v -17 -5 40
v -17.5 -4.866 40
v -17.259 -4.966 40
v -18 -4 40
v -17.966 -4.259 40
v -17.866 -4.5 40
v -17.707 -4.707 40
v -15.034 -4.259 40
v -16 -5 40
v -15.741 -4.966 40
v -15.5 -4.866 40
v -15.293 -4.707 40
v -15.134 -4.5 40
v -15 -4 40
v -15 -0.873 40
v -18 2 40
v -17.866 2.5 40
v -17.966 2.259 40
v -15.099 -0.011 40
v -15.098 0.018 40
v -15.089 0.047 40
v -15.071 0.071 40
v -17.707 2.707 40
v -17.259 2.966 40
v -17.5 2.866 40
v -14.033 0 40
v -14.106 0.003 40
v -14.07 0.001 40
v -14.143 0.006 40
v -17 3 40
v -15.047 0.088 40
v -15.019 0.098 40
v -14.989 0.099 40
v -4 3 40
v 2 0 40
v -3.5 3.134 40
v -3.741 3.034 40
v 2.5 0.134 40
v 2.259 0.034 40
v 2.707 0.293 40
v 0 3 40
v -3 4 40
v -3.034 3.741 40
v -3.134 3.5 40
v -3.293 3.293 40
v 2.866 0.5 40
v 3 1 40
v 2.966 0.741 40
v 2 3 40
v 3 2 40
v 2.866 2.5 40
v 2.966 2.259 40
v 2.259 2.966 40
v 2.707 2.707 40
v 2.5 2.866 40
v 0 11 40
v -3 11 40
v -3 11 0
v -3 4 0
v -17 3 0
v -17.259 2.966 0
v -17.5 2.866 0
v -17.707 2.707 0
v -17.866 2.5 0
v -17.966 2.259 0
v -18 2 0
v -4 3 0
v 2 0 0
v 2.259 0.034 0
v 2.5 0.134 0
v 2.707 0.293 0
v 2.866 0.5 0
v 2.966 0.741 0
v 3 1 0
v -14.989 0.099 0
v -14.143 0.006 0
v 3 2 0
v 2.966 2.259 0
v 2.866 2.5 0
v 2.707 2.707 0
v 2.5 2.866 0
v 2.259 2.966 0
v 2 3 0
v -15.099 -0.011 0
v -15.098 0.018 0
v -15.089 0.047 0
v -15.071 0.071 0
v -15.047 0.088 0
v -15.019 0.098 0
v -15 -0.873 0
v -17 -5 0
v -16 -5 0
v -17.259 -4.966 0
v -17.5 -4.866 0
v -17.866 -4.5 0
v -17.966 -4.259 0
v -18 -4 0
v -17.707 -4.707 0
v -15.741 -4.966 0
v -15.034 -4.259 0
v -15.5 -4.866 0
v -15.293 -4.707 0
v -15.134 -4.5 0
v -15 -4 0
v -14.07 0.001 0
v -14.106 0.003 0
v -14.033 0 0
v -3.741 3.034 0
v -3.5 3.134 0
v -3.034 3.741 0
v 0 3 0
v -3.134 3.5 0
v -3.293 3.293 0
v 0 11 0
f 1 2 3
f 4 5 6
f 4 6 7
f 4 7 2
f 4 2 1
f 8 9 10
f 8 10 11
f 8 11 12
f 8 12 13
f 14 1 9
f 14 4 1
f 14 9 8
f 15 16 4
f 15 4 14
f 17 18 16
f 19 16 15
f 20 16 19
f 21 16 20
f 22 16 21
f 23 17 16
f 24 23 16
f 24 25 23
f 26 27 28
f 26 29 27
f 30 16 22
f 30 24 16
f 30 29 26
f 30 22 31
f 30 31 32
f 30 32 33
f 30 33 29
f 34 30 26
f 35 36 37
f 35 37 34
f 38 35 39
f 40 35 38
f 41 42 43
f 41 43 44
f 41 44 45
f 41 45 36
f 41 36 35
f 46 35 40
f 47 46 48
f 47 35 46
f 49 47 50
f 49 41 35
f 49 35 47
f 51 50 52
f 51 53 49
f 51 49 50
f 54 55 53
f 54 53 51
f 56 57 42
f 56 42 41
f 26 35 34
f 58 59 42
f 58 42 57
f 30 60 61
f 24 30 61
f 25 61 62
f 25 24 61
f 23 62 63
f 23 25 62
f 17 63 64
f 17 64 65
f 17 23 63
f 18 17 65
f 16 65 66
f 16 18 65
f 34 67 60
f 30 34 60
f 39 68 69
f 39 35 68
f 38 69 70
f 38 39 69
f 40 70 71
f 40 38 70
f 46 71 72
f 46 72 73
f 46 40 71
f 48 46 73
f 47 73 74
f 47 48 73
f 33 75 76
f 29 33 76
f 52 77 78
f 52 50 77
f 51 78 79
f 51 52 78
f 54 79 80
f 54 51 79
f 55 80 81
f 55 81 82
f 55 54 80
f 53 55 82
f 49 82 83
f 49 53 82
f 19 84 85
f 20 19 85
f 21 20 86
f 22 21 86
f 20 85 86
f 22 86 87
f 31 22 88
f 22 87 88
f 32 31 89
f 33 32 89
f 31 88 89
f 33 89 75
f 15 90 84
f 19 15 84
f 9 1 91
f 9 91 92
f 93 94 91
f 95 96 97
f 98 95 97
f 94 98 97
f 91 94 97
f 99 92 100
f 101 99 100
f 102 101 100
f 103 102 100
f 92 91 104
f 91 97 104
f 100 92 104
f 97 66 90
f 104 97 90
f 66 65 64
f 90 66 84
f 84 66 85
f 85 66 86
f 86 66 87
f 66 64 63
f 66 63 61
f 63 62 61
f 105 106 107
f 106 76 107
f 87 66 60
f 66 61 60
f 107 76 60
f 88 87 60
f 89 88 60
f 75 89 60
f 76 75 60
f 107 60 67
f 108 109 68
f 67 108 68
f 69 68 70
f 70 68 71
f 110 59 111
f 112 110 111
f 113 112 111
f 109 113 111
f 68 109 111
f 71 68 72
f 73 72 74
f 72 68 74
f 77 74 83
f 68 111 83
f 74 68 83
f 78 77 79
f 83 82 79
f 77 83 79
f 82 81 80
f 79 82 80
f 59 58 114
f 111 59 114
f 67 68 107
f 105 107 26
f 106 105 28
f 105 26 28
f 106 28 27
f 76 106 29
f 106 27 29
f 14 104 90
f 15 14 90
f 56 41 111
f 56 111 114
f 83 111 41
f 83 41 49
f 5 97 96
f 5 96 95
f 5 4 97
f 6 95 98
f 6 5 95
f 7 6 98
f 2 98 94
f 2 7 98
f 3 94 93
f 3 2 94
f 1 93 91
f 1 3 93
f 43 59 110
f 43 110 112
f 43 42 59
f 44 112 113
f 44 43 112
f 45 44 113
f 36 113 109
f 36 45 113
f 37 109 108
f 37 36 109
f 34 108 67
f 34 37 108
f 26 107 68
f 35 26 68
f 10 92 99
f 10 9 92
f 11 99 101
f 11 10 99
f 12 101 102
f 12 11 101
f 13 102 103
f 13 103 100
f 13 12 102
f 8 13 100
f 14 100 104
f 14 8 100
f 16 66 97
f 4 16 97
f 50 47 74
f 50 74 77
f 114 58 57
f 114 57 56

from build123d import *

# Parameters (mm, degrees)
F0_W     = 3
F0_H     = 8
F0_H_2   = 3
F1_DEPTH = 40
F2_R     = 1


with BuildPart() as f1:
    # F0 (on Top) → F1 (new body)
    with BuildSketch(Plane.XY):
        with BuildLine():
            Line((-14.0882119191, 0), (0, 0))
            Line((0, 0), (0, 3))
            Line((0, 3), (-3, 3))
            Line((-3, 3), (-18, 3))
            Line((-18, 3), (-18, -5))
            Line((-18, -5), (-15, -5))
            Line((-15, -5), (-15, -0.87328878))
            Line((-15, -0.87328878), (-15.0993422135, -0.0114509659))
            ThreePointArc((-15.0993422135, -0.0114509659), (-15.0708824979, 0.0705384398), (-14.9890325392, 0.0993967545))
            Line((-14.9890325392, 0.0993967545), (-14.0882119191, 0))
        make_face()
        with Locations((-1.5, 7)):
            Rectangle(F0_W, F0_H)
        with Locations((1.5, 1.5)):
            Rectangle(F0_W, F0_H_2)
    extrude(amount=F1_DEPTH)

    # F2
    f2_edges = [f1.edges().sort_by_distance(p)[0] for p in [
        (-18, -5, 20),
        (-15, -5, 20),
        (-18, 3, 20),
        (3, 0, 20),
        (3, 3, 20),
        (-3, 3, 20),
        (-14.088212, 0, 20),
    ]]
    fillet(f2_edges, radius=F2_R)


solid = f1.part
